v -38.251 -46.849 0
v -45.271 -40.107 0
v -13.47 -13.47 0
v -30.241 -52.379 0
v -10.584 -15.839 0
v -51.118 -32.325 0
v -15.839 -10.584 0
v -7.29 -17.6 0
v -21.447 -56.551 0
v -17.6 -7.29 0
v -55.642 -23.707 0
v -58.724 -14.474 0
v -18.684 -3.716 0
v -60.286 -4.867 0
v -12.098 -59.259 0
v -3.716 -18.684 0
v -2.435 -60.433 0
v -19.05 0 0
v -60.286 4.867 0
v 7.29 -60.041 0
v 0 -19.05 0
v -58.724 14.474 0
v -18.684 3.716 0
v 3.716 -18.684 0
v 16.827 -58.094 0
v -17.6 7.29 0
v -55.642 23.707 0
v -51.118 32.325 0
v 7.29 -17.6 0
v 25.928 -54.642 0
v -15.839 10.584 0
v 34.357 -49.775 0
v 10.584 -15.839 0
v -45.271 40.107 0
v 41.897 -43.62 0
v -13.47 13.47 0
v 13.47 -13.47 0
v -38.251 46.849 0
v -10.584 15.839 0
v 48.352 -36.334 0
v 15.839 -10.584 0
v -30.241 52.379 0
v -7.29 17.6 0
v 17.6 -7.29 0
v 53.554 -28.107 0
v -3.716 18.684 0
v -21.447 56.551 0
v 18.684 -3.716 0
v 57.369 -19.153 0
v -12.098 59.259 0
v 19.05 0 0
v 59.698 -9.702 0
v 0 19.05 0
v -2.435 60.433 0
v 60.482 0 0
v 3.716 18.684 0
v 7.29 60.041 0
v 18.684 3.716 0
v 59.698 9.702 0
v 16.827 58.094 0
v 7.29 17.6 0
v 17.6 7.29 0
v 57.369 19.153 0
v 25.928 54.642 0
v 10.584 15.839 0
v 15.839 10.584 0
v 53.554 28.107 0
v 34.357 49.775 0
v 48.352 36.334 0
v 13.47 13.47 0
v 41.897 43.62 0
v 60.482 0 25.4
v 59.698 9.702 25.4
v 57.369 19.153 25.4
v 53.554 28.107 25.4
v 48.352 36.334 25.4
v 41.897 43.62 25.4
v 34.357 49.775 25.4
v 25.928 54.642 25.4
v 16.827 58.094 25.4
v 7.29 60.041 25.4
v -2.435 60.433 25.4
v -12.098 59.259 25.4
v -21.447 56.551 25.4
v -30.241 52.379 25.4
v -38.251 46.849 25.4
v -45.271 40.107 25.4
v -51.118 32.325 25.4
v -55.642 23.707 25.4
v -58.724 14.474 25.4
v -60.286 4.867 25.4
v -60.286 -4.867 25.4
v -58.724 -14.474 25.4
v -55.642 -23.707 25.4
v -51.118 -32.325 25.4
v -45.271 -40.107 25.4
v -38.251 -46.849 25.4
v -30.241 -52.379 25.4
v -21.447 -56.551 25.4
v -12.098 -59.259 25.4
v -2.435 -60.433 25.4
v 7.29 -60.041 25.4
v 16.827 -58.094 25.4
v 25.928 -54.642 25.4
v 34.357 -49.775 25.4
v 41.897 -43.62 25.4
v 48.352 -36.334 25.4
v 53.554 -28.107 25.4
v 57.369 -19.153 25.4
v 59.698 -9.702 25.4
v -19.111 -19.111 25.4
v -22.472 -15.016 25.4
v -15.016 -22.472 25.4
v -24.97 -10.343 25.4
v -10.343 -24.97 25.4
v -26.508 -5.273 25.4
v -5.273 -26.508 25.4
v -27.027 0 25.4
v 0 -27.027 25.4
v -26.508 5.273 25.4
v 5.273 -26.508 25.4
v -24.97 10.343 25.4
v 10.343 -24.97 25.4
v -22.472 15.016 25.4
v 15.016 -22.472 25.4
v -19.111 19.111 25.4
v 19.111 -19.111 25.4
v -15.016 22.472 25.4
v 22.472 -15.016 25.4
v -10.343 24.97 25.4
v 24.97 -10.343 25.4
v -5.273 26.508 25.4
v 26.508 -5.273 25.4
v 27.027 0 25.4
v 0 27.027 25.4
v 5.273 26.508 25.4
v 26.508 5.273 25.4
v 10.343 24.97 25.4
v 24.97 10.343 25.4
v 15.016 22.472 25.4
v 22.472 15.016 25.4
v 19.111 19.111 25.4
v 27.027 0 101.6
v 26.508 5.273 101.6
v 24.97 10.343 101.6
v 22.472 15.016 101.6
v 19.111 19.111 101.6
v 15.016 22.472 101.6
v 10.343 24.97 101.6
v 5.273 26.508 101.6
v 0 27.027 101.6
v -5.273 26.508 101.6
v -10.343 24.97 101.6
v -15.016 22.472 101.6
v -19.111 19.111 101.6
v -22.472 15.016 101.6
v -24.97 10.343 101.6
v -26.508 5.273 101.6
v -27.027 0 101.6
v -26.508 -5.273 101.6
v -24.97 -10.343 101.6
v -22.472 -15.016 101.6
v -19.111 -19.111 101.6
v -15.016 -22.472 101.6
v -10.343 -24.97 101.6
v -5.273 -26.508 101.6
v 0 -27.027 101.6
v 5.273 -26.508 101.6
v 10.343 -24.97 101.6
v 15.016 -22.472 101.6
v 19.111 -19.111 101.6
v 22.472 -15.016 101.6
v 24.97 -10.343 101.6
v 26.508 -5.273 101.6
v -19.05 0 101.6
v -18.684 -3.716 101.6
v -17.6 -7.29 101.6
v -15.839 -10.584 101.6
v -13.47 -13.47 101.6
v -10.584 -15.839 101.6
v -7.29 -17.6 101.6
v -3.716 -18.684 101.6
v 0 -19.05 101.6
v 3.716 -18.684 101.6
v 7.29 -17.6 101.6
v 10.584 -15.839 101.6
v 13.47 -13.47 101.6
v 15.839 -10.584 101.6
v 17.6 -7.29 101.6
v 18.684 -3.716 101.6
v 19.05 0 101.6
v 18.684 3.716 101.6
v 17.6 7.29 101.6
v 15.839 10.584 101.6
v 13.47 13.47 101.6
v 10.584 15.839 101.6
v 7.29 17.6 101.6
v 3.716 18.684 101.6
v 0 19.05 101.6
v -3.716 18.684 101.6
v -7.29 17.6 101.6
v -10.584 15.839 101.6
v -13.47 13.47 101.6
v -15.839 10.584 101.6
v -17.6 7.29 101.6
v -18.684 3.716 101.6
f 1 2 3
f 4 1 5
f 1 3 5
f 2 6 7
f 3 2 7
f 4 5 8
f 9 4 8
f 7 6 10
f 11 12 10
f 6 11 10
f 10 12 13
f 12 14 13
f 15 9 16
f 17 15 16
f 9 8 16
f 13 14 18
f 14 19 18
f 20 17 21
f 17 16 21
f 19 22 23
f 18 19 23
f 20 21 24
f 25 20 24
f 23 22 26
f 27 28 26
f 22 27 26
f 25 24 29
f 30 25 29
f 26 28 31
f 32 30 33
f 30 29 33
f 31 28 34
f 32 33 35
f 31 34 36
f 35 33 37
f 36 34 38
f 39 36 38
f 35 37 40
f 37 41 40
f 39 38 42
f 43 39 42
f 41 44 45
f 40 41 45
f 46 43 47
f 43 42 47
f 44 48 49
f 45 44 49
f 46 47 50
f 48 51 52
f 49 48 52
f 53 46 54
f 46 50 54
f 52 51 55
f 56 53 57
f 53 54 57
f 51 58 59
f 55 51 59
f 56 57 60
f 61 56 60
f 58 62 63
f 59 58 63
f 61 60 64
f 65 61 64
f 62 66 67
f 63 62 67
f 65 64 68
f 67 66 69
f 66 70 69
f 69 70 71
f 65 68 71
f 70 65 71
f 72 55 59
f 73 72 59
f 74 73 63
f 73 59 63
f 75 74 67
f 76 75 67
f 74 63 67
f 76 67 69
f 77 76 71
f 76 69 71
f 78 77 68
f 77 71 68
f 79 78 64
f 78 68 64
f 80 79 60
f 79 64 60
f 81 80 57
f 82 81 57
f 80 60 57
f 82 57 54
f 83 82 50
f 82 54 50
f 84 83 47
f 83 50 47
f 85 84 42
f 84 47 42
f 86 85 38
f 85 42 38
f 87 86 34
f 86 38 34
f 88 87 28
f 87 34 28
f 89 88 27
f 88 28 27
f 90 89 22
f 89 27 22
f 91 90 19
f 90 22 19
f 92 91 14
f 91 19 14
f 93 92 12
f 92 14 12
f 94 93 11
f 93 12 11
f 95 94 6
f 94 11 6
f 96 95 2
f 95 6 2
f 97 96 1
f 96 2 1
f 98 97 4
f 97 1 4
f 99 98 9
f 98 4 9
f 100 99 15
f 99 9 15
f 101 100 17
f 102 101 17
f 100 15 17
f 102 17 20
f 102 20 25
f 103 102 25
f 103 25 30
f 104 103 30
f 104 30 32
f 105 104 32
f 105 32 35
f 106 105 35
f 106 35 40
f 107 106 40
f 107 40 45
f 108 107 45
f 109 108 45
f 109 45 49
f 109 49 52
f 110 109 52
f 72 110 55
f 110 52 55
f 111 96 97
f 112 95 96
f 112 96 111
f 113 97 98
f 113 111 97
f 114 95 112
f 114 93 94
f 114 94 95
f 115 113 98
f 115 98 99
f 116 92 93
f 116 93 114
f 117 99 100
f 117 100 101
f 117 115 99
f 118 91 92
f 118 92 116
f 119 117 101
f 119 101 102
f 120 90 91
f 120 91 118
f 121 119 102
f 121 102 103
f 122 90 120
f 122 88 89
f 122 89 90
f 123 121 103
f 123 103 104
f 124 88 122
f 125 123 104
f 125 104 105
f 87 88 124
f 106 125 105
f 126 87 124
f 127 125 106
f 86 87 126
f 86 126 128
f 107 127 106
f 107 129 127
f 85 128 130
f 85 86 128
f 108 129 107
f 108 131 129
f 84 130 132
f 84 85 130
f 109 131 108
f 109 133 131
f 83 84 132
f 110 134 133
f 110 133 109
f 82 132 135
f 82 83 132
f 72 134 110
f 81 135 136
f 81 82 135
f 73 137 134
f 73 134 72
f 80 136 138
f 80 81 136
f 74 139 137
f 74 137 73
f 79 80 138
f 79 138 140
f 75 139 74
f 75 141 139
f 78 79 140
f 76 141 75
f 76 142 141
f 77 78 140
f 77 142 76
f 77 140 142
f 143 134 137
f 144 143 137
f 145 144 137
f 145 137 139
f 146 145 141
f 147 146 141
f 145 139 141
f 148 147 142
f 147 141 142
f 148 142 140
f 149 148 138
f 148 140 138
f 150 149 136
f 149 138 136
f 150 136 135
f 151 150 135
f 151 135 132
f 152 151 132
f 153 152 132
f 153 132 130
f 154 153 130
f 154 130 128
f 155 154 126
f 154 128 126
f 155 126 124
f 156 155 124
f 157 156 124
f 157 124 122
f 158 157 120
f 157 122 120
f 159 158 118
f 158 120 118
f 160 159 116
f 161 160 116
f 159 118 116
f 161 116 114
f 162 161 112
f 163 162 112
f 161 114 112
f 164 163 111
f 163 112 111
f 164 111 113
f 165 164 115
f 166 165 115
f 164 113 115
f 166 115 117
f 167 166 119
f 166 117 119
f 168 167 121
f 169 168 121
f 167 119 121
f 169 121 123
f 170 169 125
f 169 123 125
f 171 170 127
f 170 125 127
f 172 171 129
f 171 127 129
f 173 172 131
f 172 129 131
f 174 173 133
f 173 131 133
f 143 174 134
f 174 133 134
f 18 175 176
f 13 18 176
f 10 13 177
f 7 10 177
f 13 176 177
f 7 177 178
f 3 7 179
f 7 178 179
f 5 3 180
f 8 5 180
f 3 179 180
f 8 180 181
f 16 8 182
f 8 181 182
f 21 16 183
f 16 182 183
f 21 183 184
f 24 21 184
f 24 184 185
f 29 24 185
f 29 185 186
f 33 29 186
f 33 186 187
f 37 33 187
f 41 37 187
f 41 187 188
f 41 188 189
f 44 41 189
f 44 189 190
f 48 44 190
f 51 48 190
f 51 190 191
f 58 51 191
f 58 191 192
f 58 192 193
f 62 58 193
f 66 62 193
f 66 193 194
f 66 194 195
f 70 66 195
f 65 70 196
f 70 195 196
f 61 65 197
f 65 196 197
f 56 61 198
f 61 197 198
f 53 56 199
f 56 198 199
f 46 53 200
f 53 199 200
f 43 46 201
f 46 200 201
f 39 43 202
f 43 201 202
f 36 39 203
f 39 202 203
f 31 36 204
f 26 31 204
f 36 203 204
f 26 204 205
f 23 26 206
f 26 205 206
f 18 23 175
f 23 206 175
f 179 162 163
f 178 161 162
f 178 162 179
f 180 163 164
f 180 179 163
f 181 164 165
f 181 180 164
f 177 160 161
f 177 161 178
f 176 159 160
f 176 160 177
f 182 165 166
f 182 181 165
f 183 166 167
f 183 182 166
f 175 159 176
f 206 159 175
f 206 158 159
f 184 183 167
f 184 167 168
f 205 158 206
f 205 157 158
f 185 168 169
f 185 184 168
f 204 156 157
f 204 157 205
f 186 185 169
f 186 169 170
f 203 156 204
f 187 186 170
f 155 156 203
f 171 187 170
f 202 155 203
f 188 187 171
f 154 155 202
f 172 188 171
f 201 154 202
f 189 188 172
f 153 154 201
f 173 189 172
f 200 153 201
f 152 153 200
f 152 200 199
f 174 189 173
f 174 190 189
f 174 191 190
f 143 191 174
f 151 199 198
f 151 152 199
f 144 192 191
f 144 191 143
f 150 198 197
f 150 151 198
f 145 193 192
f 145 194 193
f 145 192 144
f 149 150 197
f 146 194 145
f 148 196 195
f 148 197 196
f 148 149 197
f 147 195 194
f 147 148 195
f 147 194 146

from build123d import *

# Parameters (mm, degrees)
F0_R     = 60.481634
F1_DEPTH = 25.4
F2_R     = 27.027248
F3_DEPTH = 76.2
F5_D     = 38.1


with BuildPart() as f1:
    # F0 (on Top) → F1 (new body)
    with BuildSketch(Plane.XY):
        Circle(F0_R)
    extrude(amount=F1_DEPTH)

    # F2 (on face) → F3 (join)
    with BuildSketch(Plane.XY.offset(25.4)):
        Circle(F2_R)
    extrude(amount=F3_DEPTH)

    # F5 (through all)
    with Locations(Plane(origin=(0, 0, 0), x_dir=(1, 0, 0), z_dir=(0, 0, -1))):
        with Locations((0, 0)):
            Hole(F5_D / 2)


solid = f1.part
